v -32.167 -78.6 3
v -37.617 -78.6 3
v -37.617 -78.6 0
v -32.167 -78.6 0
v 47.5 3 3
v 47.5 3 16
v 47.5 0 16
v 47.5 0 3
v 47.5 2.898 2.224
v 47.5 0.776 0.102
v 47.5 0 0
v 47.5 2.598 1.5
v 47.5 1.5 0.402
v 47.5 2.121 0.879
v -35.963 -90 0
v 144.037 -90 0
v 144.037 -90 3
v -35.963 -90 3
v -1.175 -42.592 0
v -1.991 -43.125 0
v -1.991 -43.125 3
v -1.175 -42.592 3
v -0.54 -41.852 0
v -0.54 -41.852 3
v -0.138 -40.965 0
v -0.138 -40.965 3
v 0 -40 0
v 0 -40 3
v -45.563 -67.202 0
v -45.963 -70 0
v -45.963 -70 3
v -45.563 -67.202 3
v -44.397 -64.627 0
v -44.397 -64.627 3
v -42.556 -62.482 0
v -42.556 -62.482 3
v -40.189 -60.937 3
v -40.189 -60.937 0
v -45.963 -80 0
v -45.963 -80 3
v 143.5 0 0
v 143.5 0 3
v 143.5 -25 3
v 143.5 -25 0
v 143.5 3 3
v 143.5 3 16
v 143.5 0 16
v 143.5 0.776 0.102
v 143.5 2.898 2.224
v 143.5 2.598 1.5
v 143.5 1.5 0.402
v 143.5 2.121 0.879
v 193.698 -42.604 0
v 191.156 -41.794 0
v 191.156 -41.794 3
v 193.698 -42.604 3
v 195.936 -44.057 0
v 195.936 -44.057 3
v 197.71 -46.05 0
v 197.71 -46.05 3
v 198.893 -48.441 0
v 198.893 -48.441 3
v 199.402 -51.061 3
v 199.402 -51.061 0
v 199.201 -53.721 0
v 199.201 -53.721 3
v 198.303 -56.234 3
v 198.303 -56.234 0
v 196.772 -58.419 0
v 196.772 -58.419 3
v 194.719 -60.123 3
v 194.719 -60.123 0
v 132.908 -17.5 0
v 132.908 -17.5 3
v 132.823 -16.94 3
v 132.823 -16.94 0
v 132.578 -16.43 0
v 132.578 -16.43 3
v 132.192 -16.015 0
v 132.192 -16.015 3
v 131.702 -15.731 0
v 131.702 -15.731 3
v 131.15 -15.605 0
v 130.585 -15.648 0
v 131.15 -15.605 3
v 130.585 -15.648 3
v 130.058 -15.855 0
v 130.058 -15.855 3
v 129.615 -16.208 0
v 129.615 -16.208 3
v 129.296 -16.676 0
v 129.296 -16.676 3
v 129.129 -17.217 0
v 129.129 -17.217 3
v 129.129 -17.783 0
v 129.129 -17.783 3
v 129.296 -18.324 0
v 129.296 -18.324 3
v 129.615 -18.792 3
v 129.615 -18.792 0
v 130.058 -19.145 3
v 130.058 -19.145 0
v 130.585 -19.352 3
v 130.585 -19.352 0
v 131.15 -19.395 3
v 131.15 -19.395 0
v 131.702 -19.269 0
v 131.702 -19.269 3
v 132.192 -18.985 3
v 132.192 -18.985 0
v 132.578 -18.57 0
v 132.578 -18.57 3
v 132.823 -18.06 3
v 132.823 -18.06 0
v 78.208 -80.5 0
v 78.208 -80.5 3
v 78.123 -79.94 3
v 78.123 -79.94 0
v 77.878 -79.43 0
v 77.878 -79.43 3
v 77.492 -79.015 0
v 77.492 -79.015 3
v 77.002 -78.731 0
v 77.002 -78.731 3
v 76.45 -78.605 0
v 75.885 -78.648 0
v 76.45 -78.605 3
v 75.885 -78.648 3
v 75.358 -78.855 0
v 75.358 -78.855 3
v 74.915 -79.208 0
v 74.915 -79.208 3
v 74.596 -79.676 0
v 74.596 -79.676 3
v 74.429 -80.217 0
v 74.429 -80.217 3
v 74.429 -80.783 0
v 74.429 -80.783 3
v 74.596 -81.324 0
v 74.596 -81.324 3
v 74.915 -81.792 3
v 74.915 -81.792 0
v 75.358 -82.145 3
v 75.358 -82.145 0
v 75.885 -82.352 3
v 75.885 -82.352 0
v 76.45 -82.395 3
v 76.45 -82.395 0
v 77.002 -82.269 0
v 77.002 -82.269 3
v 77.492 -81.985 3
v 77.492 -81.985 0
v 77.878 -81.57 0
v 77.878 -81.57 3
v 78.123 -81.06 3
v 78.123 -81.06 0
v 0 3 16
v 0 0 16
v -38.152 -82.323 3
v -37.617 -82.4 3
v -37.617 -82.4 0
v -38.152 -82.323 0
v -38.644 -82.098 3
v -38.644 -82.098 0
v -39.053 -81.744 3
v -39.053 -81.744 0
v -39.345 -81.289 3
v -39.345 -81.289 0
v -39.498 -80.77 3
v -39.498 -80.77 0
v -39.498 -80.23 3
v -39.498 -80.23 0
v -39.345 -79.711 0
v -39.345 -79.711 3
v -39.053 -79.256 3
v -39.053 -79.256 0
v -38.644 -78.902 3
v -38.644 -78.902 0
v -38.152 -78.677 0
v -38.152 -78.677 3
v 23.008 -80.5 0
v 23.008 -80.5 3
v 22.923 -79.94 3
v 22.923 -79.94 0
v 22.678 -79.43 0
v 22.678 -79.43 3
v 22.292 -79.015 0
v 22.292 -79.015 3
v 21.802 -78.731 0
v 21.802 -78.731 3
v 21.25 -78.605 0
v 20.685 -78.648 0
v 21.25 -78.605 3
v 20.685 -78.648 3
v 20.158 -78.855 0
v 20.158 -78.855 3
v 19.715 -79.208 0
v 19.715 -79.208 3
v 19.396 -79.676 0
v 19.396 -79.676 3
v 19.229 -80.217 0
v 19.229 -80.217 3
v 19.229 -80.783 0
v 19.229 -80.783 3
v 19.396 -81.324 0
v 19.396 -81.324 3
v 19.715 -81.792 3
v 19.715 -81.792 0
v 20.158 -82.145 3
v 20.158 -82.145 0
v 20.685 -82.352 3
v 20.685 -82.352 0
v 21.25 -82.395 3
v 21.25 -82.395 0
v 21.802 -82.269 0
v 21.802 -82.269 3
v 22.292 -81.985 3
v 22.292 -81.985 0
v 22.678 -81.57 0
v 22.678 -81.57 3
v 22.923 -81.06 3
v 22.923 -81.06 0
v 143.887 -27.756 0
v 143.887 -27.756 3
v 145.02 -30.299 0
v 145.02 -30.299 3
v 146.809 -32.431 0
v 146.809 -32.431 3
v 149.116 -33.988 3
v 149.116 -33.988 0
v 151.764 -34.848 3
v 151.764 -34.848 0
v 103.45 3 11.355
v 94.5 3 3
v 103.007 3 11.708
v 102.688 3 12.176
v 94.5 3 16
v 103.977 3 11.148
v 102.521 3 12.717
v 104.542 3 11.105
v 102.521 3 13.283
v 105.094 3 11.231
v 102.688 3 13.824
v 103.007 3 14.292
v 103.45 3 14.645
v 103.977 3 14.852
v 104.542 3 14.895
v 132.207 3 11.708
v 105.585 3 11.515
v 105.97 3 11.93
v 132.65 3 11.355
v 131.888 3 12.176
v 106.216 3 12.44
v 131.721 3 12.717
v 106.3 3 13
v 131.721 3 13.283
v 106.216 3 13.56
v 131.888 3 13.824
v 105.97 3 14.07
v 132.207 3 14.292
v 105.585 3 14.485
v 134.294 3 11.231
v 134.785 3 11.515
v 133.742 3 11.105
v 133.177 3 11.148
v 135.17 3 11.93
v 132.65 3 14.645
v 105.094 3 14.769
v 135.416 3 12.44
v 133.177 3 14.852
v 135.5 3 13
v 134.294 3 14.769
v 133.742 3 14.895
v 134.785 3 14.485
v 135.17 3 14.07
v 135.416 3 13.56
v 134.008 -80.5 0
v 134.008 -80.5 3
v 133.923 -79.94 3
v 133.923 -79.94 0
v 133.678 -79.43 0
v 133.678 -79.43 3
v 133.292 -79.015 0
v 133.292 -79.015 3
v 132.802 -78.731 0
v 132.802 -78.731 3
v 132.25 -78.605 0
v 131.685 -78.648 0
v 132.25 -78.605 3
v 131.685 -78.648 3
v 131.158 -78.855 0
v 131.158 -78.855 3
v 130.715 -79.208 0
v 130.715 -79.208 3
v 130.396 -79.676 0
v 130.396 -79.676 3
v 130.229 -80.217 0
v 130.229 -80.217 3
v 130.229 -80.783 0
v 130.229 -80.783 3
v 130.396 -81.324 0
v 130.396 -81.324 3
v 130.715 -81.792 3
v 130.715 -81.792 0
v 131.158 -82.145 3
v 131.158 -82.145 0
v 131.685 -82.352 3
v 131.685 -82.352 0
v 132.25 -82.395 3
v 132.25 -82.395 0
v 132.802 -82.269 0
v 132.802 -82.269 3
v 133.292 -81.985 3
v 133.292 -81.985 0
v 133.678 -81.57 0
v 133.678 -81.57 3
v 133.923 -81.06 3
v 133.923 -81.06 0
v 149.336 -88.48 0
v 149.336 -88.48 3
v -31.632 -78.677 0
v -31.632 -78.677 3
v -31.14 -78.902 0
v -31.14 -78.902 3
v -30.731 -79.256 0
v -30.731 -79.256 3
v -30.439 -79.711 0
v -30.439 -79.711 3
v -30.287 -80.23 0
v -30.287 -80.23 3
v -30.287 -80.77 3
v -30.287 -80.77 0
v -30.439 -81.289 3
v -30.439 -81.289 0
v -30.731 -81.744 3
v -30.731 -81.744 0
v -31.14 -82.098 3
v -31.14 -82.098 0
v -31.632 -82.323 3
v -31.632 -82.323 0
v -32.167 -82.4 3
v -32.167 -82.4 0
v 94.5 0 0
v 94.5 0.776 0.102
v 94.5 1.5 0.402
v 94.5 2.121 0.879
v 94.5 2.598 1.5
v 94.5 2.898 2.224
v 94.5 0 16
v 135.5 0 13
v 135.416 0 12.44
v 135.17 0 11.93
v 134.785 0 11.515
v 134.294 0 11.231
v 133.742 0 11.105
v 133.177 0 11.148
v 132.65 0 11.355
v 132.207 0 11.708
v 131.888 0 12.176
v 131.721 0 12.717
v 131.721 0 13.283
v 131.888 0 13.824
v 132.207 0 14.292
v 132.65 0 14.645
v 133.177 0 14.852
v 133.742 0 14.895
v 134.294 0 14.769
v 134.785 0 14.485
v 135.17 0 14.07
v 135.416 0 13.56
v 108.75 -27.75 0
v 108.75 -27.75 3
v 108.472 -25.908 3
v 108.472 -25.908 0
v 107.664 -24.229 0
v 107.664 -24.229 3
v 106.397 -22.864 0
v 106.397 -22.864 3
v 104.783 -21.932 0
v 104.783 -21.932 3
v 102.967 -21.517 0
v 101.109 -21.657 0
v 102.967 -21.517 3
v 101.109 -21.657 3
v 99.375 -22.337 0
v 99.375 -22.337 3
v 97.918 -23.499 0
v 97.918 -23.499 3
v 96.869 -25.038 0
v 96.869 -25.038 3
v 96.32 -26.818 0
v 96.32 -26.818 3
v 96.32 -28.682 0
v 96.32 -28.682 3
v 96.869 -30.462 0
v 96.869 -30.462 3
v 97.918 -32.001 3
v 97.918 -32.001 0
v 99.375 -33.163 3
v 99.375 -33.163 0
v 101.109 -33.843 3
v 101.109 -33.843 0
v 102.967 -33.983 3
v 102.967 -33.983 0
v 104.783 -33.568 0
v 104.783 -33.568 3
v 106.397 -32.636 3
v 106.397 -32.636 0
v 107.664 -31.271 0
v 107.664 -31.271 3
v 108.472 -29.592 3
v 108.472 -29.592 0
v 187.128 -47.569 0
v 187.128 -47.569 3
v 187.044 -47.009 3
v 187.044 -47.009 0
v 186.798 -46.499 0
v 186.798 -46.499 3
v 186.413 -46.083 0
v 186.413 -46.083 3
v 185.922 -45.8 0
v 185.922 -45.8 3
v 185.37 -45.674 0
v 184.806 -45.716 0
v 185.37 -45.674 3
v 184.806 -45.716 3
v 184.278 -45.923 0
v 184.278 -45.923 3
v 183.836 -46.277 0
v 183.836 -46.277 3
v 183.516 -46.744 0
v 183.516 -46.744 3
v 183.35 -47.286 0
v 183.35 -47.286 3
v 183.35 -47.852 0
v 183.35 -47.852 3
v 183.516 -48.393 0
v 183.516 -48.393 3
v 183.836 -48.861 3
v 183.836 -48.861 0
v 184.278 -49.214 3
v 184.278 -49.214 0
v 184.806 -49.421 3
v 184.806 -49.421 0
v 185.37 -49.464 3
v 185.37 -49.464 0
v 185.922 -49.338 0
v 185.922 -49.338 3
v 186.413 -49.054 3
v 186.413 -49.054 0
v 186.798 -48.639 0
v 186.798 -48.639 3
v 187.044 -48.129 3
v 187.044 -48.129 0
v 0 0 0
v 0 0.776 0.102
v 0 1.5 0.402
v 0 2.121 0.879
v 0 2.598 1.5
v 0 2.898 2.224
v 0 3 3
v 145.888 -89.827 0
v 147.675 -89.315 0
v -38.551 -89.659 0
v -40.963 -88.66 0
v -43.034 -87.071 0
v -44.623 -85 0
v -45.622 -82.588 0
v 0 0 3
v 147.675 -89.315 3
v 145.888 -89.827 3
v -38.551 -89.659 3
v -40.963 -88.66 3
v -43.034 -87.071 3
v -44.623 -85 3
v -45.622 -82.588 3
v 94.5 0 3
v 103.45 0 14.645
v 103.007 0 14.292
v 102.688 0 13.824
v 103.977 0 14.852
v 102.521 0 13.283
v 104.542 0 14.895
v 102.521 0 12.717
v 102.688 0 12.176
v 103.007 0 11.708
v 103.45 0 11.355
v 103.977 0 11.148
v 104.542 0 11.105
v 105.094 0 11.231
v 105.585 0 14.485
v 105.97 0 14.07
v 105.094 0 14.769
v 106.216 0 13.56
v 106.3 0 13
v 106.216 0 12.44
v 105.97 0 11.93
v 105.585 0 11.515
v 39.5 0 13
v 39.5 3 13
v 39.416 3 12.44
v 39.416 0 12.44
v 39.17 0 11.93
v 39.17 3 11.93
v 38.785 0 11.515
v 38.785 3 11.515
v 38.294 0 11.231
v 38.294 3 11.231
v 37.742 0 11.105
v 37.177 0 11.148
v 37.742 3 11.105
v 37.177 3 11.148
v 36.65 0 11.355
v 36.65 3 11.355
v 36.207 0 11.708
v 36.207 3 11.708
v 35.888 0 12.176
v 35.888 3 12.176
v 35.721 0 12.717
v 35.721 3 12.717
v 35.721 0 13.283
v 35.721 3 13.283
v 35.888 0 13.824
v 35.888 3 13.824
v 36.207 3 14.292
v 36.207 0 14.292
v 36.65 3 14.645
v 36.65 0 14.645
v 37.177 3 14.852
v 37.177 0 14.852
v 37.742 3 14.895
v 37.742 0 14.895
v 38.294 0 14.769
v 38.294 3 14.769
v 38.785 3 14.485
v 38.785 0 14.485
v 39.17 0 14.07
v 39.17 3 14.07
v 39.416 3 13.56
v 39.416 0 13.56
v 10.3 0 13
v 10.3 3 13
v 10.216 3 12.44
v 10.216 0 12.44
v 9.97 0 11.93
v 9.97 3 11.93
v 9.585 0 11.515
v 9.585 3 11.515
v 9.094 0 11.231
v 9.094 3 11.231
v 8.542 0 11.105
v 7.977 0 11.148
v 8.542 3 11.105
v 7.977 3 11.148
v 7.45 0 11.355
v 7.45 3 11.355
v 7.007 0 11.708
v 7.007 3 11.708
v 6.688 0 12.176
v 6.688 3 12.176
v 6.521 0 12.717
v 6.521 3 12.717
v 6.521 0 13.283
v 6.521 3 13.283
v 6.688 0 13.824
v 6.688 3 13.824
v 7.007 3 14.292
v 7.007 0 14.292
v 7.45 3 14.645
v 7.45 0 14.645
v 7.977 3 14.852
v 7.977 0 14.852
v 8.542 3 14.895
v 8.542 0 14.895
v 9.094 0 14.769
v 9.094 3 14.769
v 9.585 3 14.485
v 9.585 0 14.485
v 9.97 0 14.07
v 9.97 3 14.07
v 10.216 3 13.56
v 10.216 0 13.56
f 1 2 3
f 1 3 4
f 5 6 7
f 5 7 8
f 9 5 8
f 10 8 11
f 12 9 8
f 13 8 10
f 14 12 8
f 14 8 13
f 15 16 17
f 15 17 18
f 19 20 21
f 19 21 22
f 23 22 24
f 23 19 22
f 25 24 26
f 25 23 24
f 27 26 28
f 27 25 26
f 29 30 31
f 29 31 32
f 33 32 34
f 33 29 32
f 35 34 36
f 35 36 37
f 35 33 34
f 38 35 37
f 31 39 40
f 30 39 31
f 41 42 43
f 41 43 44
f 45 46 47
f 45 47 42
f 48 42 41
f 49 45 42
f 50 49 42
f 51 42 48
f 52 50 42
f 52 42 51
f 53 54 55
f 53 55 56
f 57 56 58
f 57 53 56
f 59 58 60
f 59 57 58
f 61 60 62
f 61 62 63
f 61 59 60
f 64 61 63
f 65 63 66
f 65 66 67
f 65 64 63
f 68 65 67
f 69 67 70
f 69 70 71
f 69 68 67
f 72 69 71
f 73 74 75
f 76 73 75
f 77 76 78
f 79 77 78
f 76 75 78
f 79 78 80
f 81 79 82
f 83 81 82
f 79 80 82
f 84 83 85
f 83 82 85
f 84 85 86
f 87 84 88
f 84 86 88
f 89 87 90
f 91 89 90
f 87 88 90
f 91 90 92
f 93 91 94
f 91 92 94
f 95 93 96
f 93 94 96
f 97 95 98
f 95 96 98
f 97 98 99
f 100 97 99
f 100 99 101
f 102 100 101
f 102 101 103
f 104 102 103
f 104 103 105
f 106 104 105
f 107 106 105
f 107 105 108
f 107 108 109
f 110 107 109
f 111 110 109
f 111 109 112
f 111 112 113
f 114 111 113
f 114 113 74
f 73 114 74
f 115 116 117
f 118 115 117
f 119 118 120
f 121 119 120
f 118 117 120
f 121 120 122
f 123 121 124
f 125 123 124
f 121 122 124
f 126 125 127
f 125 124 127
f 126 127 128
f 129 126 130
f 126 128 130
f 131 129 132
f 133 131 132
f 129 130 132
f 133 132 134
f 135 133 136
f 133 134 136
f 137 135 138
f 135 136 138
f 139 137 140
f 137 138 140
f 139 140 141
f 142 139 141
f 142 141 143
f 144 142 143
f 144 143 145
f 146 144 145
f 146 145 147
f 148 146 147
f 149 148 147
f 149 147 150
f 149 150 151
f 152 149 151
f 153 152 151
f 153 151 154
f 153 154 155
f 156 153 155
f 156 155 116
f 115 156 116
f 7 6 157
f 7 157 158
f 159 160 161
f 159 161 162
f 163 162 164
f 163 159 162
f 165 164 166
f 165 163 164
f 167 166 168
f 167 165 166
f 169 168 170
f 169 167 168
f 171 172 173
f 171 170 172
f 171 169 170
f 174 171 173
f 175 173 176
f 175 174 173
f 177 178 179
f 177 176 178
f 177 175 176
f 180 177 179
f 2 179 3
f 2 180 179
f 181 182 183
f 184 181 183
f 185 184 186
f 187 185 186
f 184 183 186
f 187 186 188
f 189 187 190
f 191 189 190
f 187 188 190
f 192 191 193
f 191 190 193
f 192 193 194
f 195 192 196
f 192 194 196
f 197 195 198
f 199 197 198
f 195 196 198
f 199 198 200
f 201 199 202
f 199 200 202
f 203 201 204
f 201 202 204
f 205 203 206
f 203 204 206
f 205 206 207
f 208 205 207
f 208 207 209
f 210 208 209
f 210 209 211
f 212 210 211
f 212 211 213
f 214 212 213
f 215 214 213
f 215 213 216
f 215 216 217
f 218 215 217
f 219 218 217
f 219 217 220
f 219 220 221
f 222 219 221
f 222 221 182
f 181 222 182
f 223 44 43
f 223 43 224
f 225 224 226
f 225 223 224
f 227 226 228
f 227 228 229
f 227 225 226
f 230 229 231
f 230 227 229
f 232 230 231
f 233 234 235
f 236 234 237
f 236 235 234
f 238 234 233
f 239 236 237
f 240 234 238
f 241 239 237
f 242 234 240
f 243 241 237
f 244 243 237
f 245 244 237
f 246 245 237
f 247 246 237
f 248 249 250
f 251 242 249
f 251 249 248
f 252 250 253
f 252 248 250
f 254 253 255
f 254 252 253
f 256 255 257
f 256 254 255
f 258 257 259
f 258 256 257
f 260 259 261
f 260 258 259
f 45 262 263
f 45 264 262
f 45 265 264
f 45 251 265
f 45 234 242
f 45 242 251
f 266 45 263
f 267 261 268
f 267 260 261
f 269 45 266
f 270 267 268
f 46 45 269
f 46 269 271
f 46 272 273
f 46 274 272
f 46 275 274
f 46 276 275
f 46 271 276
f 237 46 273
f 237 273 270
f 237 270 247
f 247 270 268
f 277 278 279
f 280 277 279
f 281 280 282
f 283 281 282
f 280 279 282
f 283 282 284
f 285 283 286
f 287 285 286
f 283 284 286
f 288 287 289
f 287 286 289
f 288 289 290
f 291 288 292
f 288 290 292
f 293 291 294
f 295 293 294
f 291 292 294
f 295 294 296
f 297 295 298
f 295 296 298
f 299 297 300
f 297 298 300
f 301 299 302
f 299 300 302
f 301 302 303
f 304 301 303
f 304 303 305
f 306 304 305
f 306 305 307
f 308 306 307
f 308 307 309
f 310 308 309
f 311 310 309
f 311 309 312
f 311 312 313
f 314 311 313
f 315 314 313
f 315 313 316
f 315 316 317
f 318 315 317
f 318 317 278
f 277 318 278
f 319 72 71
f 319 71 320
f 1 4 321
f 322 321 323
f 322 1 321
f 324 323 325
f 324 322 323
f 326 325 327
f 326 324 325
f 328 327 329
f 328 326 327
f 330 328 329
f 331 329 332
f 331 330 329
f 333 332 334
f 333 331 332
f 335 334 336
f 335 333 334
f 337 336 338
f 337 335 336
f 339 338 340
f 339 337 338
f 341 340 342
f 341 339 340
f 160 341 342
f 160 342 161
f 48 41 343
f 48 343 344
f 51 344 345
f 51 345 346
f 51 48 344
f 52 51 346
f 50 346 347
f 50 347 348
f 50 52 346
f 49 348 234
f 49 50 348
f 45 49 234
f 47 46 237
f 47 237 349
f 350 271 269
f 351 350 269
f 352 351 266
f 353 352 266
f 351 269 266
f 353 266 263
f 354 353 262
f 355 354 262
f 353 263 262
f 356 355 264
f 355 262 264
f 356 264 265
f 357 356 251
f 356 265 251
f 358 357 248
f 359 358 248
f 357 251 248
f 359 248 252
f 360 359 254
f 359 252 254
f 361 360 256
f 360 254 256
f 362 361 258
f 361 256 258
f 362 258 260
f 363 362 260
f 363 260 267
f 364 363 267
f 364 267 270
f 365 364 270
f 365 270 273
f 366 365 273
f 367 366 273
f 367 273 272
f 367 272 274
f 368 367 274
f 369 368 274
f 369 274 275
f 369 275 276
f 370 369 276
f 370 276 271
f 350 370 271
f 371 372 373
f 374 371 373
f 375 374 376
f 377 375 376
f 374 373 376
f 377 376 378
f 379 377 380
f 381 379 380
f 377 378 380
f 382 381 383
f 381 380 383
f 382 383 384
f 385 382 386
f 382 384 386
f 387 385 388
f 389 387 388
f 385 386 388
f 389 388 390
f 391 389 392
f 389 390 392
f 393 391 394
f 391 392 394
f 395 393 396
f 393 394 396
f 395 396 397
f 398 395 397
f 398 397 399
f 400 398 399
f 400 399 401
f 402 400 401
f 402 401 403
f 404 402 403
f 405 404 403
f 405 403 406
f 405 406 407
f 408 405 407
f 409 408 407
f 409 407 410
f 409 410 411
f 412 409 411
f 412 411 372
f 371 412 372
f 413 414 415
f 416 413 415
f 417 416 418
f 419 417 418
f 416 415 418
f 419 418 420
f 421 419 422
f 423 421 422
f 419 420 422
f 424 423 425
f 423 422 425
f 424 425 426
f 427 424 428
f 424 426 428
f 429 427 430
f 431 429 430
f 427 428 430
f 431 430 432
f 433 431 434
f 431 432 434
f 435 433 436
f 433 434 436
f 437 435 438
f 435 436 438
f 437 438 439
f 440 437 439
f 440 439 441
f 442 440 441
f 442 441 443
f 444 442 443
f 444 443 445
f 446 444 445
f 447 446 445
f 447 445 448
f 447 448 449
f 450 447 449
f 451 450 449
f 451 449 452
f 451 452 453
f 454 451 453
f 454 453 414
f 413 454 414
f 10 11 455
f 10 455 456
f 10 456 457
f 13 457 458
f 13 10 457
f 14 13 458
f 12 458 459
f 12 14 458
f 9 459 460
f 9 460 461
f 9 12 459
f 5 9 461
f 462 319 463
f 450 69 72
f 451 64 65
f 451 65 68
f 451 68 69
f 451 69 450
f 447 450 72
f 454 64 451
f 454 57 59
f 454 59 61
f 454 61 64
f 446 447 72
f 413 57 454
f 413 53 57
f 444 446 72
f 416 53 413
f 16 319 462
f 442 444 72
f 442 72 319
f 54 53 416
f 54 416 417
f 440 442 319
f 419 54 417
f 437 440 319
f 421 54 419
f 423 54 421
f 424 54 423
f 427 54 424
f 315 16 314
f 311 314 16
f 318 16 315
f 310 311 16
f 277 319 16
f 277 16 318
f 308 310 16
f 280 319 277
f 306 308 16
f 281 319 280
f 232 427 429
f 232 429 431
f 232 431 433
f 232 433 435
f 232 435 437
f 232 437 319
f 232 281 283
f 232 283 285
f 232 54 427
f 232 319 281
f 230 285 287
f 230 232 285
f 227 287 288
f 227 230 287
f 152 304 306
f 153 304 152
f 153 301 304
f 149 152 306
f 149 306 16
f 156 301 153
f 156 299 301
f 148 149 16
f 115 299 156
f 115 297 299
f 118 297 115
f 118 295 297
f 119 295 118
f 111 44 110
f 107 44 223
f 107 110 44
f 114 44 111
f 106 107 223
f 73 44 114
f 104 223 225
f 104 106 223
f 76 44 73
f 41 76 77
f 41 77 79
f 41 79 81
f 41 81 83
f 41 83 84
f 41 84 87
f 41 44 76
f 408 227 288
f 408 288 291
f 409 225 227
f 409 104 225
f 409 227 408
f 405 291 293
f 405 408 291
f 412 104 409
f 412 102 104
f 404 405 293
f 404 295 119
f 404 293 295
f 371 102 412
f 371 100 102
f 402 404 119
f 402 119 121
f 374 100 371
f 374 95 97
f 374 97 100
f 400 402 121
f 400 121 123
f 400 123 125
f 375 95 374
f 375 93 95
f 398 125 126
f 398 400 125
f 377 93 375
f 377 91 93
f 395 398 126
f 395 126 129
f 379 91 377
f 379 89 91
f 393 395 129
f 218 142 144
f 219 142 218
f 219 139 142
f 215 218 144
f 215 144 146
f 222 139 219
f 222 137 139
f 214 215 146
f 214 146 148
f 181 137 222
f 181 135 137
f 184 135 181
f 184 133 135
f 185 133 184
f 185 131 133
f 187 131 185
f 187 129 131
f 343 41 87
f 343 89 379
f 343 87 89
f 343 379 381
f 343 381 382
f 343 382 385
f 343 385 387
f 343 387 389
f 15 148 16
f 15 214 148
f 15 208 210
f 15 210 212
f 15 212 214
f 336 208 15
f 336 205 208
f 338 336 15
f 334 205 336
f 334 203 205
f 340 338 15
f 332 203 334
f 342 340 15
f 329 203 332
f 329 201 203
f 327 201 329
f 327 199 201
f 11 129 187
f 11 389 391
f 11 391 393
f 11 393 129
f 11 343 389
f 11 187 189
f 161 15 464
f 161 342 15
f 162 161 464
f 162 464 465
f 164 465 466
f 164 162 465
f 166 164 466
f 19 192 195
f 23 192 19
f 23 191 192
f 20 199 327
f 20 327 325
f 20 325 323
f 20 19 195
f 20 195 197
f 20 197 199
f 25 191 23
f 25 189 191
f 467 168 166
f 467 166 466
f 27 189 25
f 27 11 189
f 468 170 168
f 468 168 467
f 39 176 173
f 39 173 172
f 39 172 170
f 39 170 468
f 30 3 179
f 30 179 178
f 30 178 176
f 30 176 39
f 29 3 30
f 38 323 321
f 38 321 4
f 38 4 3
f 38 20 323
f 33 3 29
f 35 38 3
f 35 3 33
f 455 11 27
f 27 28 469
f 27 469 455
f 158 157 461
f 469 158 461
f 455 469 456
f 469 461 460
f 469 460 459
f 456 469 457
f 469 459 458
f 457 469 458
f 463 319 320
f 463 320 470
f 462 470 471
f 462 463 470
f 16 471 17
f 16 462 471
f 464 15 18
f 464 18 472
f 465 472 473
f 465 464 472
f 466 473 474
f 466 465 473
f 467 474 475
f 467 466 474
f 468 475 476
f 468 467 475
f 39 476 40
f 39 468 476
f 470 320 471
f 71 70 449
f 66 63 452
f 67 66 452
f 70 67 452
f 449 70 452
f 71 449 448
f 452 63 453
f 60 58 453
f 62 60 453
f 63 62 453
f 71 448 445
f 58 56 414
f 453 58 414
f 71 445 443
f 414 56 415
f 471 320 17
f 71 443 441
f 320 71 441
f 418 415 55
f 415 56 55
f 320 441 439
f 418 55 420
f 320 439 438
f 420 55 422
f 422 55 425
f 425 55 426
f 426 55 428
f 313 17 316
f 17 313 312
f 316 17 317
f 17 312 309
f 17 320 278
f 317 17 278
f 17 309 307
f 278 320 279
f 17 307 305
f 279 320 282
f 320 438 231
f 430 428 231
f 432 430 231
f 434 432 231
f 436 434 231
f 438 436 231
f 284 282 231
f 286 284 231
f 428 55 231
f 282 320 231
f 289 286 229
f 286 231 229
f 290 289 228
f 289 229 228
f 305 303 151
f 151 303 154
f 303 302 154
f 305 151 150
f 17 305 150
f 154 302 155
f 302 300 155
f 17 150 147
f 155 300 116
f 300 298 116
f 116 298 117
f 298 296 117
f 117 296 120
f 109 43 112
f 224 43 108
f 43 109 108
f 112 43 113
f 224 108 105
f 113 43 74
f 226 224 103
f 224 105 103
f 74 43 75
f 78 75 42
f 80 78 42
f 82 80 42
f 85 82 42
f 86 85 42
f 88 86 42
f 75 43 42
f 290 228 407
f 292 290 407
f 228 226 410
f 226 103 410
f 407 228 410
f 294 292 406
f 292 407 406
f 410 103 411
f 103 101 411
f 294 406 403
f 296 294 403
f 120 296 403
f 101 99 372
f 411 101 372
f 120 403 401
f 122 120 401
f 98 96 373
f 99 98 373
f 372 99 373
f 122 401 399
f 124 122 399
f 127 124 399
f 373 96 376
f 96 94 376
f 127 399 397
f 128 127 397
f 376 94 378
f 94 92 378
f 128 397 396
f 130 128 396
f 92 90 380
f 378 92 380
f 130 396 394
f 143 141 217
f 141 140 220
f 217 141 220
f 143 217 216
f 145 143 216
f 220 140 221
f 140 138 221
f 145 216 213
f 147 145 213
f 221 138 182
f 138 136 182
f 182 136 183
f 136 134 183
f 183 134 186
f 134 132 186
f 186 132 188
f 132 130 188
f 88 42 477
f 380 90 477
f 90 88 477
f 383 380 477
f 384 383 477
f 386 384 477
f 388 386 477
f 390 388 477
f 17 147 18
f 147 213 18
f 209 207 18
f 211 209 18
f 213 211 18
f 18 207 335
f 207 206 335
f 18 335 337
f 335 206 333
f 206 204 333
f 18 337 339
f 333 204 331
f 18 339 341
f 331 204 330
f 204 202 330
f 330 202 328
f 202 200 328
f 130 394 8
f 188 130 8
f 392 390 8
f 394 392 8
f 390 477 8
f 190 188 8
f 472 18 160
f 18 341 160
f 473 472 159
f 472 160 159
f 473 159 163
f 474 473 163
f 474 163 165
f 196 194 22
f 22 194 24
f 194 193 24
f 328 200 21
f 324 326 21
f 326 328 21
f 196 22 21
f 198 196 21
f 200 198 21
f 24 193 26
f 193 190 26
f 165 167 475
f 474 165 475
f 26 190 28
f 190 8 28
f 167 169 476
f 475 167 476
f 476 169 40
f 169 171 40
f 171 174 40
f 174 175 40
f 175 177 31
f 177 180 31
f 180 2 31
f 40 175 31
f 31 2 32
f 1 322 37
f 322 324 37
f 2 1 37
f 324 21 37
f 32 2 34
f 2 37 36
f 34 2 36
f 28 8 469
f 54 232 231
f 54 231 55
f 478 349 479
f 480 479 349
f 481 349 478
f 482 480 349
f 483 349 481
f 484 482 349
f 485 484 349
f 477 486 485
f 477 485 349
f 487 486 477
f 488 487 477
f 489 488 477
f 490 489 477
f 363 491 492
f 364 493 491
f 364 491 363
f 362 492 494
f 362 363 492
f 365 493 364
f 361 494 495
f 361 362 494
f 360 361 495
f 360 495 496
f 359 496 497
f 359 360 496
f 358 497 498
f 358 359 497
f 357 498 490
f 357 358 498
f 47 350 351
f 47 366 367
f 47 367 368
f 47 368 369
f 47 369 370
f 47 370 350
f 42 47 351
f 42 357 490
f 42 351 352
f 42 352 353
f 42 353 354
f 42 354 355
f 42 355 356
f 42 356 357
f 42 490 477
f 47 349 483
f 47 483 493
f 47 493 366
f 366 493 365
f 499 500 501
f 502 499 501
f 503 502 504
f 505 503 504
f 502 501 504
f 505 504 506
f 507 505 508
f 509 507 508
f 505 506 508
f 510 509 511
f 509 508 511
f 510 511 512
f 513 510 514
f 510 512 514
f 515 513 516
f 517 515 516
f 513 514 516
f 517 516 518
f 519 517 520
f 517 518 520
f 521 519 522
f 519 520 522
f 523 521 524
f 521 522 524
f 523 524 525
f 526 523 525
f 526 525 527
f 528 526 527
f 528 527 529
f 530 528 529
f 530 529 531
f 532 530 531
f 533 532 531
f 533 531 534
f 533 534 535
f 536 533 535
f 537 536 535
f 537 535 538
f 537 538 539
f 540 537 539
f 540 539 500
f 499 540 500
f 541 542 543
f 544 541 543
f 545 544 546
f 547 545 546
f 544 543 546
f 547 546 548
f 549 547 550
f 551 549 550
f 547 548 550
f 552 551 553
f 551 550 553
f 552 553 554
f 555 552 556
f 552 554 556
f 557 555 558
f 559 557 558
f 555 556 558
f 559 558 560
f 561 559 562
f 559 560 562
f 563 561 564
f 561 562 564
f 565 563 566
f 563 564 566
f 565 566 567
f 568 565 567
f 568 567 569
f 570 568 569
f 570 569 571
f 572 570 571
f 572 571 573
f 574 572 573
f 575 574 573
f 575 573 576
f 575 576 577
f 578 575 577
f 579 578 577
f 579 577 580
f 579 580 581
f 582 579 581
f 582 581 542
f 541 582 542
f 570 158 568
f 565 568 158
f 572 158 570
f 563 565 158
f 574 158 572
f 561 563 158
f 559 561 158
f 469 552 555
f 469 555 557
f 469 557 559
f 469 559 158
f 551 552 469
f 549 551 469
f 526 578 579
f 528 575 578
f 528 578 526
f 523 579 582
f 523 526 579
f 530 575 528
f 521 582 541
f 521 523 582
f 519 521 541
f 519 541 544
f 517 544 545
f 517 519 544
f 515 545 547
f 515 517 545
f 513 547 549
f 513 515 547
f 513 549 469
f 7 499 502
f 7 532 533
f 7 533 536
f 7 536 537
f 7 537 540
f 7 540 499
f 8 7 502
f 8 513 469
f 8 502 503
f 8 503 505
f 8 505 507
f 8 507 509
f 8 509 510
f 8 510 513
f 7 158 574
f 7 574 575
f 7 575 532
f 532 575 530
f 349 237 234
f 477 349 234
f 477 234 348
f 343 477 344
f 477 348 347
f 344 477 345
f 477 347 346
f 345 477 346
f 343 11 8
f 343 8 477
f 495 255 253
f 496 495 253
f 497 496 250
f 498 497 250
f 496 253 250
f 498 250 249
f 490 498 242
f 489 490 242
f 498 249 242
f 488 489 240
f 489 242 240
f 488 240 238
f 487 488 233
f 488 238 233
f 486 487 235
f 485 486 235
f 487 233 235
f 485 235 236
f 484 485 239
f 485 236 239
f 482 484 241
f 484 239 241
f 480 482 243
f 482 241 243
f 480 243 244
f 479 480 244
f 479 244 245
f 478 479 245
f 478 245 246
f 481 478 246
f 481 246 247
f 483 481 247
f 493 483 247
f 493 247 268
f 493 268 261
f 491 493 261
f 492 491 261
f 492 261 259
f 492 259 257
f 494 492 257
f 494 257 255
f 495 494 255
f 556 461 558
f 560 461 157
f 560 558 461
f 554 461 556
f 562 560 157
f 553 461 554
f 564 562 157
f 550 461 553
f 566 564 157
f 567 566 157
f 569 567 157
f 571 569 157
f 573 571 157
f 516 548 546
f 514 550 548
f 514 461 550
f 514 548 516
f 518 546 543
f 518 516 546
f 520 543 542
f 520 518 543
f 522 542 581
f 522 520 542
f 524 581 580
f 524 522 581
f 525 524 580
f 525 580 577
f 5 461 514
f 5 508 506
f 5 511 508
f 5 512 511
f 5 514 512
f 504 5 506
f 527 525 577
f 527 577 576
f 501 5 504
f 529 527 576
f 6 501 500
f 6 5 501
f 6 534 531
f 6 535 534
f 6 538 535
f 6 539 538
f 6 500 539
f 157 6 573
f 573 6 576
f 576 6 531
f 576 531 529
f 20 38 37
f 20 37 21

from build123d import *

# Parameters (mm, degrees)
BOSS_EXTRUDE1_DEPTH = 3
SKETCH2_R           = 1.9
SKETCH2_R_2         = 6.25
CUT_EXTRUDE1_DEPTH  = 4
BOSS_EXTRUDE3_DEPTH = 143.5
SKETCH6_W           = 47
SKETCH6_H           = 16
CUT_EXTRUDE4_DEPTH  = 3
SKETCH7_R           = 1.9
CUT_EXTRUDE5_DEPTH  = 94


with BuildPart() as part:
    # Sketch1 → Boss-Extrude1 (new body)
    with BuildSketch(Plane.XY):
        with BuildLine():
            Line((0, 0), (143.5, 0))
            Line((143.5, 0), (143.5, -25))
            ThreePointArc((143.5, -25), (145.839555569, -31.427876097), (151.763518223, -34.84807753))
            Line((151.763518223, -34.84807753), (191.155828344, -41.794004637))
            ThreePointArc((191.155828344, -41.794004637), (199.235618402, -49.733992213), (194.718539209, -60.122563128))
            Line((194.718539209, -60.122563128), (149.336384129, -88.480480962))
            ThreePointArc((149.336384129, -88.480480962), (146.793565045, -89.612616959), (144.037191487, -90))
            Line((144.037191487, -90), (-35.962808513, -90))
            ThreePointArc((-35.962808513, -90), (-43.033876325, -87.071067812), (-45.962808513, -80))
            Line((-45.962808513, -80), (-45.962808513, -70))
            ThreePointArc((-45.962808513, -70), (-44.396722971, -64.627003917), (-40.18899113, -60.93692213))
            Line((-40.18899113, -60.93692213), (-1.99069399, -43.124763645))
            ThreePointArc((-1.99069399, -43.124763645), (-0.539954223, -41.852499015), (0, -40))
            Line((0, -40), (0, 0))
        make_face()
    extrude(amount=BOSS_EXTRUDE1_DEPTH)

    # Sketch2 → Cut-Extrude1 (cut, through all)
    with BuildSketch(Plane.XY.offset(3)):
        with Locations((185.228339525, -47.568848131)):
            Circle(SKETCH2_R)
        with Locations((132.107823371, -80.5)):
            Circle(SKETCH2_R)
        with Locations((76.307823371, -80.5)):
            Circle(SKETCH2_R)
        with Locations((21.107823371, -80.5)):
            Circle(SKETCH2_R)
        with Locations((102.5, -27.75)):
            Circle(SKETCH2_R_2)
        with Locations((131.007823371, -17.5)):
            Circle(SKETCH2_R)
        with BuildLine():
            Line((-32.167176629, -82.4), (-37.617176629, -82.4))
            ThreePointArc((-37.617176629, -82.4), (-39.517176629, -80.5), (-37.617176629, -78.6))
            Line((-37.617176629, -78.6), (-32.167176629, -78.6))
            ThreePointArc((-32.167176629, -78.6), (-30.267176629, -80.5), (-32.167176629, -82.4))
        make_face()
    extrude(amount=-CUT_EXTRUDE1_DEPTH, mode=Mode.SUBTRACT)

    # Sketch3 → Boss-Extrude3 (add)
    with BuildSketch(Plane(origin=(143.5, 0, 0), x_dir=(0, 0, -1), z_dir=(1, 0, 0))):
        with BuildLine():
            Line((-3, 0), (0, 0))
            ThreePointArc((0, 0), (-0.878679656, 2.121320344), (-3, 3))
            Line((-3, 3), (-16, 3))
            Line((-16, 3), (-16, 0))
            Line((-16, 0), (-3, 0))
        make_face()
    extrude(amount=-BOSS_EXTRUDE3_DEPTH)

    # Sketch6 → Cut-Extrude4 (cut)
    with BuildSketch(Plane(origin=(0, 3, 0), x_dir=(1, 0, 0), z_dir=(0, 1, 0))):
        with Locations((71, -8)):
            Rectangle(SKETCH6_W, SKETCH6_H)
    extrude(amount=-CUT_EXTRUDE4_DEPTH, mode=Mode.SUBTRACT)

    # Sketch7 → Cut-Extrude5 (cut, through all)
    with BuildSketch(Plane(origin=(0, 3, 0), x_dir=(1, 0, 0), z_dir=(0, 1, 0))):
        with Locations((133.6, -13)):
            Circle(SKETCH7_R)
        with Locations((104.4, -13)):
            Circle(SKETCH7_R)
        with Locations((37.6, -13)):
            Circle(SKETCH7_R)
        with Locations((8.4, -13)):
            Circle(SKETCH7_R)
    extrude(amount=-CUT_EXTRUDE5_DEPTH, mode=Mode.SUBTRACT)


solid = part.part
